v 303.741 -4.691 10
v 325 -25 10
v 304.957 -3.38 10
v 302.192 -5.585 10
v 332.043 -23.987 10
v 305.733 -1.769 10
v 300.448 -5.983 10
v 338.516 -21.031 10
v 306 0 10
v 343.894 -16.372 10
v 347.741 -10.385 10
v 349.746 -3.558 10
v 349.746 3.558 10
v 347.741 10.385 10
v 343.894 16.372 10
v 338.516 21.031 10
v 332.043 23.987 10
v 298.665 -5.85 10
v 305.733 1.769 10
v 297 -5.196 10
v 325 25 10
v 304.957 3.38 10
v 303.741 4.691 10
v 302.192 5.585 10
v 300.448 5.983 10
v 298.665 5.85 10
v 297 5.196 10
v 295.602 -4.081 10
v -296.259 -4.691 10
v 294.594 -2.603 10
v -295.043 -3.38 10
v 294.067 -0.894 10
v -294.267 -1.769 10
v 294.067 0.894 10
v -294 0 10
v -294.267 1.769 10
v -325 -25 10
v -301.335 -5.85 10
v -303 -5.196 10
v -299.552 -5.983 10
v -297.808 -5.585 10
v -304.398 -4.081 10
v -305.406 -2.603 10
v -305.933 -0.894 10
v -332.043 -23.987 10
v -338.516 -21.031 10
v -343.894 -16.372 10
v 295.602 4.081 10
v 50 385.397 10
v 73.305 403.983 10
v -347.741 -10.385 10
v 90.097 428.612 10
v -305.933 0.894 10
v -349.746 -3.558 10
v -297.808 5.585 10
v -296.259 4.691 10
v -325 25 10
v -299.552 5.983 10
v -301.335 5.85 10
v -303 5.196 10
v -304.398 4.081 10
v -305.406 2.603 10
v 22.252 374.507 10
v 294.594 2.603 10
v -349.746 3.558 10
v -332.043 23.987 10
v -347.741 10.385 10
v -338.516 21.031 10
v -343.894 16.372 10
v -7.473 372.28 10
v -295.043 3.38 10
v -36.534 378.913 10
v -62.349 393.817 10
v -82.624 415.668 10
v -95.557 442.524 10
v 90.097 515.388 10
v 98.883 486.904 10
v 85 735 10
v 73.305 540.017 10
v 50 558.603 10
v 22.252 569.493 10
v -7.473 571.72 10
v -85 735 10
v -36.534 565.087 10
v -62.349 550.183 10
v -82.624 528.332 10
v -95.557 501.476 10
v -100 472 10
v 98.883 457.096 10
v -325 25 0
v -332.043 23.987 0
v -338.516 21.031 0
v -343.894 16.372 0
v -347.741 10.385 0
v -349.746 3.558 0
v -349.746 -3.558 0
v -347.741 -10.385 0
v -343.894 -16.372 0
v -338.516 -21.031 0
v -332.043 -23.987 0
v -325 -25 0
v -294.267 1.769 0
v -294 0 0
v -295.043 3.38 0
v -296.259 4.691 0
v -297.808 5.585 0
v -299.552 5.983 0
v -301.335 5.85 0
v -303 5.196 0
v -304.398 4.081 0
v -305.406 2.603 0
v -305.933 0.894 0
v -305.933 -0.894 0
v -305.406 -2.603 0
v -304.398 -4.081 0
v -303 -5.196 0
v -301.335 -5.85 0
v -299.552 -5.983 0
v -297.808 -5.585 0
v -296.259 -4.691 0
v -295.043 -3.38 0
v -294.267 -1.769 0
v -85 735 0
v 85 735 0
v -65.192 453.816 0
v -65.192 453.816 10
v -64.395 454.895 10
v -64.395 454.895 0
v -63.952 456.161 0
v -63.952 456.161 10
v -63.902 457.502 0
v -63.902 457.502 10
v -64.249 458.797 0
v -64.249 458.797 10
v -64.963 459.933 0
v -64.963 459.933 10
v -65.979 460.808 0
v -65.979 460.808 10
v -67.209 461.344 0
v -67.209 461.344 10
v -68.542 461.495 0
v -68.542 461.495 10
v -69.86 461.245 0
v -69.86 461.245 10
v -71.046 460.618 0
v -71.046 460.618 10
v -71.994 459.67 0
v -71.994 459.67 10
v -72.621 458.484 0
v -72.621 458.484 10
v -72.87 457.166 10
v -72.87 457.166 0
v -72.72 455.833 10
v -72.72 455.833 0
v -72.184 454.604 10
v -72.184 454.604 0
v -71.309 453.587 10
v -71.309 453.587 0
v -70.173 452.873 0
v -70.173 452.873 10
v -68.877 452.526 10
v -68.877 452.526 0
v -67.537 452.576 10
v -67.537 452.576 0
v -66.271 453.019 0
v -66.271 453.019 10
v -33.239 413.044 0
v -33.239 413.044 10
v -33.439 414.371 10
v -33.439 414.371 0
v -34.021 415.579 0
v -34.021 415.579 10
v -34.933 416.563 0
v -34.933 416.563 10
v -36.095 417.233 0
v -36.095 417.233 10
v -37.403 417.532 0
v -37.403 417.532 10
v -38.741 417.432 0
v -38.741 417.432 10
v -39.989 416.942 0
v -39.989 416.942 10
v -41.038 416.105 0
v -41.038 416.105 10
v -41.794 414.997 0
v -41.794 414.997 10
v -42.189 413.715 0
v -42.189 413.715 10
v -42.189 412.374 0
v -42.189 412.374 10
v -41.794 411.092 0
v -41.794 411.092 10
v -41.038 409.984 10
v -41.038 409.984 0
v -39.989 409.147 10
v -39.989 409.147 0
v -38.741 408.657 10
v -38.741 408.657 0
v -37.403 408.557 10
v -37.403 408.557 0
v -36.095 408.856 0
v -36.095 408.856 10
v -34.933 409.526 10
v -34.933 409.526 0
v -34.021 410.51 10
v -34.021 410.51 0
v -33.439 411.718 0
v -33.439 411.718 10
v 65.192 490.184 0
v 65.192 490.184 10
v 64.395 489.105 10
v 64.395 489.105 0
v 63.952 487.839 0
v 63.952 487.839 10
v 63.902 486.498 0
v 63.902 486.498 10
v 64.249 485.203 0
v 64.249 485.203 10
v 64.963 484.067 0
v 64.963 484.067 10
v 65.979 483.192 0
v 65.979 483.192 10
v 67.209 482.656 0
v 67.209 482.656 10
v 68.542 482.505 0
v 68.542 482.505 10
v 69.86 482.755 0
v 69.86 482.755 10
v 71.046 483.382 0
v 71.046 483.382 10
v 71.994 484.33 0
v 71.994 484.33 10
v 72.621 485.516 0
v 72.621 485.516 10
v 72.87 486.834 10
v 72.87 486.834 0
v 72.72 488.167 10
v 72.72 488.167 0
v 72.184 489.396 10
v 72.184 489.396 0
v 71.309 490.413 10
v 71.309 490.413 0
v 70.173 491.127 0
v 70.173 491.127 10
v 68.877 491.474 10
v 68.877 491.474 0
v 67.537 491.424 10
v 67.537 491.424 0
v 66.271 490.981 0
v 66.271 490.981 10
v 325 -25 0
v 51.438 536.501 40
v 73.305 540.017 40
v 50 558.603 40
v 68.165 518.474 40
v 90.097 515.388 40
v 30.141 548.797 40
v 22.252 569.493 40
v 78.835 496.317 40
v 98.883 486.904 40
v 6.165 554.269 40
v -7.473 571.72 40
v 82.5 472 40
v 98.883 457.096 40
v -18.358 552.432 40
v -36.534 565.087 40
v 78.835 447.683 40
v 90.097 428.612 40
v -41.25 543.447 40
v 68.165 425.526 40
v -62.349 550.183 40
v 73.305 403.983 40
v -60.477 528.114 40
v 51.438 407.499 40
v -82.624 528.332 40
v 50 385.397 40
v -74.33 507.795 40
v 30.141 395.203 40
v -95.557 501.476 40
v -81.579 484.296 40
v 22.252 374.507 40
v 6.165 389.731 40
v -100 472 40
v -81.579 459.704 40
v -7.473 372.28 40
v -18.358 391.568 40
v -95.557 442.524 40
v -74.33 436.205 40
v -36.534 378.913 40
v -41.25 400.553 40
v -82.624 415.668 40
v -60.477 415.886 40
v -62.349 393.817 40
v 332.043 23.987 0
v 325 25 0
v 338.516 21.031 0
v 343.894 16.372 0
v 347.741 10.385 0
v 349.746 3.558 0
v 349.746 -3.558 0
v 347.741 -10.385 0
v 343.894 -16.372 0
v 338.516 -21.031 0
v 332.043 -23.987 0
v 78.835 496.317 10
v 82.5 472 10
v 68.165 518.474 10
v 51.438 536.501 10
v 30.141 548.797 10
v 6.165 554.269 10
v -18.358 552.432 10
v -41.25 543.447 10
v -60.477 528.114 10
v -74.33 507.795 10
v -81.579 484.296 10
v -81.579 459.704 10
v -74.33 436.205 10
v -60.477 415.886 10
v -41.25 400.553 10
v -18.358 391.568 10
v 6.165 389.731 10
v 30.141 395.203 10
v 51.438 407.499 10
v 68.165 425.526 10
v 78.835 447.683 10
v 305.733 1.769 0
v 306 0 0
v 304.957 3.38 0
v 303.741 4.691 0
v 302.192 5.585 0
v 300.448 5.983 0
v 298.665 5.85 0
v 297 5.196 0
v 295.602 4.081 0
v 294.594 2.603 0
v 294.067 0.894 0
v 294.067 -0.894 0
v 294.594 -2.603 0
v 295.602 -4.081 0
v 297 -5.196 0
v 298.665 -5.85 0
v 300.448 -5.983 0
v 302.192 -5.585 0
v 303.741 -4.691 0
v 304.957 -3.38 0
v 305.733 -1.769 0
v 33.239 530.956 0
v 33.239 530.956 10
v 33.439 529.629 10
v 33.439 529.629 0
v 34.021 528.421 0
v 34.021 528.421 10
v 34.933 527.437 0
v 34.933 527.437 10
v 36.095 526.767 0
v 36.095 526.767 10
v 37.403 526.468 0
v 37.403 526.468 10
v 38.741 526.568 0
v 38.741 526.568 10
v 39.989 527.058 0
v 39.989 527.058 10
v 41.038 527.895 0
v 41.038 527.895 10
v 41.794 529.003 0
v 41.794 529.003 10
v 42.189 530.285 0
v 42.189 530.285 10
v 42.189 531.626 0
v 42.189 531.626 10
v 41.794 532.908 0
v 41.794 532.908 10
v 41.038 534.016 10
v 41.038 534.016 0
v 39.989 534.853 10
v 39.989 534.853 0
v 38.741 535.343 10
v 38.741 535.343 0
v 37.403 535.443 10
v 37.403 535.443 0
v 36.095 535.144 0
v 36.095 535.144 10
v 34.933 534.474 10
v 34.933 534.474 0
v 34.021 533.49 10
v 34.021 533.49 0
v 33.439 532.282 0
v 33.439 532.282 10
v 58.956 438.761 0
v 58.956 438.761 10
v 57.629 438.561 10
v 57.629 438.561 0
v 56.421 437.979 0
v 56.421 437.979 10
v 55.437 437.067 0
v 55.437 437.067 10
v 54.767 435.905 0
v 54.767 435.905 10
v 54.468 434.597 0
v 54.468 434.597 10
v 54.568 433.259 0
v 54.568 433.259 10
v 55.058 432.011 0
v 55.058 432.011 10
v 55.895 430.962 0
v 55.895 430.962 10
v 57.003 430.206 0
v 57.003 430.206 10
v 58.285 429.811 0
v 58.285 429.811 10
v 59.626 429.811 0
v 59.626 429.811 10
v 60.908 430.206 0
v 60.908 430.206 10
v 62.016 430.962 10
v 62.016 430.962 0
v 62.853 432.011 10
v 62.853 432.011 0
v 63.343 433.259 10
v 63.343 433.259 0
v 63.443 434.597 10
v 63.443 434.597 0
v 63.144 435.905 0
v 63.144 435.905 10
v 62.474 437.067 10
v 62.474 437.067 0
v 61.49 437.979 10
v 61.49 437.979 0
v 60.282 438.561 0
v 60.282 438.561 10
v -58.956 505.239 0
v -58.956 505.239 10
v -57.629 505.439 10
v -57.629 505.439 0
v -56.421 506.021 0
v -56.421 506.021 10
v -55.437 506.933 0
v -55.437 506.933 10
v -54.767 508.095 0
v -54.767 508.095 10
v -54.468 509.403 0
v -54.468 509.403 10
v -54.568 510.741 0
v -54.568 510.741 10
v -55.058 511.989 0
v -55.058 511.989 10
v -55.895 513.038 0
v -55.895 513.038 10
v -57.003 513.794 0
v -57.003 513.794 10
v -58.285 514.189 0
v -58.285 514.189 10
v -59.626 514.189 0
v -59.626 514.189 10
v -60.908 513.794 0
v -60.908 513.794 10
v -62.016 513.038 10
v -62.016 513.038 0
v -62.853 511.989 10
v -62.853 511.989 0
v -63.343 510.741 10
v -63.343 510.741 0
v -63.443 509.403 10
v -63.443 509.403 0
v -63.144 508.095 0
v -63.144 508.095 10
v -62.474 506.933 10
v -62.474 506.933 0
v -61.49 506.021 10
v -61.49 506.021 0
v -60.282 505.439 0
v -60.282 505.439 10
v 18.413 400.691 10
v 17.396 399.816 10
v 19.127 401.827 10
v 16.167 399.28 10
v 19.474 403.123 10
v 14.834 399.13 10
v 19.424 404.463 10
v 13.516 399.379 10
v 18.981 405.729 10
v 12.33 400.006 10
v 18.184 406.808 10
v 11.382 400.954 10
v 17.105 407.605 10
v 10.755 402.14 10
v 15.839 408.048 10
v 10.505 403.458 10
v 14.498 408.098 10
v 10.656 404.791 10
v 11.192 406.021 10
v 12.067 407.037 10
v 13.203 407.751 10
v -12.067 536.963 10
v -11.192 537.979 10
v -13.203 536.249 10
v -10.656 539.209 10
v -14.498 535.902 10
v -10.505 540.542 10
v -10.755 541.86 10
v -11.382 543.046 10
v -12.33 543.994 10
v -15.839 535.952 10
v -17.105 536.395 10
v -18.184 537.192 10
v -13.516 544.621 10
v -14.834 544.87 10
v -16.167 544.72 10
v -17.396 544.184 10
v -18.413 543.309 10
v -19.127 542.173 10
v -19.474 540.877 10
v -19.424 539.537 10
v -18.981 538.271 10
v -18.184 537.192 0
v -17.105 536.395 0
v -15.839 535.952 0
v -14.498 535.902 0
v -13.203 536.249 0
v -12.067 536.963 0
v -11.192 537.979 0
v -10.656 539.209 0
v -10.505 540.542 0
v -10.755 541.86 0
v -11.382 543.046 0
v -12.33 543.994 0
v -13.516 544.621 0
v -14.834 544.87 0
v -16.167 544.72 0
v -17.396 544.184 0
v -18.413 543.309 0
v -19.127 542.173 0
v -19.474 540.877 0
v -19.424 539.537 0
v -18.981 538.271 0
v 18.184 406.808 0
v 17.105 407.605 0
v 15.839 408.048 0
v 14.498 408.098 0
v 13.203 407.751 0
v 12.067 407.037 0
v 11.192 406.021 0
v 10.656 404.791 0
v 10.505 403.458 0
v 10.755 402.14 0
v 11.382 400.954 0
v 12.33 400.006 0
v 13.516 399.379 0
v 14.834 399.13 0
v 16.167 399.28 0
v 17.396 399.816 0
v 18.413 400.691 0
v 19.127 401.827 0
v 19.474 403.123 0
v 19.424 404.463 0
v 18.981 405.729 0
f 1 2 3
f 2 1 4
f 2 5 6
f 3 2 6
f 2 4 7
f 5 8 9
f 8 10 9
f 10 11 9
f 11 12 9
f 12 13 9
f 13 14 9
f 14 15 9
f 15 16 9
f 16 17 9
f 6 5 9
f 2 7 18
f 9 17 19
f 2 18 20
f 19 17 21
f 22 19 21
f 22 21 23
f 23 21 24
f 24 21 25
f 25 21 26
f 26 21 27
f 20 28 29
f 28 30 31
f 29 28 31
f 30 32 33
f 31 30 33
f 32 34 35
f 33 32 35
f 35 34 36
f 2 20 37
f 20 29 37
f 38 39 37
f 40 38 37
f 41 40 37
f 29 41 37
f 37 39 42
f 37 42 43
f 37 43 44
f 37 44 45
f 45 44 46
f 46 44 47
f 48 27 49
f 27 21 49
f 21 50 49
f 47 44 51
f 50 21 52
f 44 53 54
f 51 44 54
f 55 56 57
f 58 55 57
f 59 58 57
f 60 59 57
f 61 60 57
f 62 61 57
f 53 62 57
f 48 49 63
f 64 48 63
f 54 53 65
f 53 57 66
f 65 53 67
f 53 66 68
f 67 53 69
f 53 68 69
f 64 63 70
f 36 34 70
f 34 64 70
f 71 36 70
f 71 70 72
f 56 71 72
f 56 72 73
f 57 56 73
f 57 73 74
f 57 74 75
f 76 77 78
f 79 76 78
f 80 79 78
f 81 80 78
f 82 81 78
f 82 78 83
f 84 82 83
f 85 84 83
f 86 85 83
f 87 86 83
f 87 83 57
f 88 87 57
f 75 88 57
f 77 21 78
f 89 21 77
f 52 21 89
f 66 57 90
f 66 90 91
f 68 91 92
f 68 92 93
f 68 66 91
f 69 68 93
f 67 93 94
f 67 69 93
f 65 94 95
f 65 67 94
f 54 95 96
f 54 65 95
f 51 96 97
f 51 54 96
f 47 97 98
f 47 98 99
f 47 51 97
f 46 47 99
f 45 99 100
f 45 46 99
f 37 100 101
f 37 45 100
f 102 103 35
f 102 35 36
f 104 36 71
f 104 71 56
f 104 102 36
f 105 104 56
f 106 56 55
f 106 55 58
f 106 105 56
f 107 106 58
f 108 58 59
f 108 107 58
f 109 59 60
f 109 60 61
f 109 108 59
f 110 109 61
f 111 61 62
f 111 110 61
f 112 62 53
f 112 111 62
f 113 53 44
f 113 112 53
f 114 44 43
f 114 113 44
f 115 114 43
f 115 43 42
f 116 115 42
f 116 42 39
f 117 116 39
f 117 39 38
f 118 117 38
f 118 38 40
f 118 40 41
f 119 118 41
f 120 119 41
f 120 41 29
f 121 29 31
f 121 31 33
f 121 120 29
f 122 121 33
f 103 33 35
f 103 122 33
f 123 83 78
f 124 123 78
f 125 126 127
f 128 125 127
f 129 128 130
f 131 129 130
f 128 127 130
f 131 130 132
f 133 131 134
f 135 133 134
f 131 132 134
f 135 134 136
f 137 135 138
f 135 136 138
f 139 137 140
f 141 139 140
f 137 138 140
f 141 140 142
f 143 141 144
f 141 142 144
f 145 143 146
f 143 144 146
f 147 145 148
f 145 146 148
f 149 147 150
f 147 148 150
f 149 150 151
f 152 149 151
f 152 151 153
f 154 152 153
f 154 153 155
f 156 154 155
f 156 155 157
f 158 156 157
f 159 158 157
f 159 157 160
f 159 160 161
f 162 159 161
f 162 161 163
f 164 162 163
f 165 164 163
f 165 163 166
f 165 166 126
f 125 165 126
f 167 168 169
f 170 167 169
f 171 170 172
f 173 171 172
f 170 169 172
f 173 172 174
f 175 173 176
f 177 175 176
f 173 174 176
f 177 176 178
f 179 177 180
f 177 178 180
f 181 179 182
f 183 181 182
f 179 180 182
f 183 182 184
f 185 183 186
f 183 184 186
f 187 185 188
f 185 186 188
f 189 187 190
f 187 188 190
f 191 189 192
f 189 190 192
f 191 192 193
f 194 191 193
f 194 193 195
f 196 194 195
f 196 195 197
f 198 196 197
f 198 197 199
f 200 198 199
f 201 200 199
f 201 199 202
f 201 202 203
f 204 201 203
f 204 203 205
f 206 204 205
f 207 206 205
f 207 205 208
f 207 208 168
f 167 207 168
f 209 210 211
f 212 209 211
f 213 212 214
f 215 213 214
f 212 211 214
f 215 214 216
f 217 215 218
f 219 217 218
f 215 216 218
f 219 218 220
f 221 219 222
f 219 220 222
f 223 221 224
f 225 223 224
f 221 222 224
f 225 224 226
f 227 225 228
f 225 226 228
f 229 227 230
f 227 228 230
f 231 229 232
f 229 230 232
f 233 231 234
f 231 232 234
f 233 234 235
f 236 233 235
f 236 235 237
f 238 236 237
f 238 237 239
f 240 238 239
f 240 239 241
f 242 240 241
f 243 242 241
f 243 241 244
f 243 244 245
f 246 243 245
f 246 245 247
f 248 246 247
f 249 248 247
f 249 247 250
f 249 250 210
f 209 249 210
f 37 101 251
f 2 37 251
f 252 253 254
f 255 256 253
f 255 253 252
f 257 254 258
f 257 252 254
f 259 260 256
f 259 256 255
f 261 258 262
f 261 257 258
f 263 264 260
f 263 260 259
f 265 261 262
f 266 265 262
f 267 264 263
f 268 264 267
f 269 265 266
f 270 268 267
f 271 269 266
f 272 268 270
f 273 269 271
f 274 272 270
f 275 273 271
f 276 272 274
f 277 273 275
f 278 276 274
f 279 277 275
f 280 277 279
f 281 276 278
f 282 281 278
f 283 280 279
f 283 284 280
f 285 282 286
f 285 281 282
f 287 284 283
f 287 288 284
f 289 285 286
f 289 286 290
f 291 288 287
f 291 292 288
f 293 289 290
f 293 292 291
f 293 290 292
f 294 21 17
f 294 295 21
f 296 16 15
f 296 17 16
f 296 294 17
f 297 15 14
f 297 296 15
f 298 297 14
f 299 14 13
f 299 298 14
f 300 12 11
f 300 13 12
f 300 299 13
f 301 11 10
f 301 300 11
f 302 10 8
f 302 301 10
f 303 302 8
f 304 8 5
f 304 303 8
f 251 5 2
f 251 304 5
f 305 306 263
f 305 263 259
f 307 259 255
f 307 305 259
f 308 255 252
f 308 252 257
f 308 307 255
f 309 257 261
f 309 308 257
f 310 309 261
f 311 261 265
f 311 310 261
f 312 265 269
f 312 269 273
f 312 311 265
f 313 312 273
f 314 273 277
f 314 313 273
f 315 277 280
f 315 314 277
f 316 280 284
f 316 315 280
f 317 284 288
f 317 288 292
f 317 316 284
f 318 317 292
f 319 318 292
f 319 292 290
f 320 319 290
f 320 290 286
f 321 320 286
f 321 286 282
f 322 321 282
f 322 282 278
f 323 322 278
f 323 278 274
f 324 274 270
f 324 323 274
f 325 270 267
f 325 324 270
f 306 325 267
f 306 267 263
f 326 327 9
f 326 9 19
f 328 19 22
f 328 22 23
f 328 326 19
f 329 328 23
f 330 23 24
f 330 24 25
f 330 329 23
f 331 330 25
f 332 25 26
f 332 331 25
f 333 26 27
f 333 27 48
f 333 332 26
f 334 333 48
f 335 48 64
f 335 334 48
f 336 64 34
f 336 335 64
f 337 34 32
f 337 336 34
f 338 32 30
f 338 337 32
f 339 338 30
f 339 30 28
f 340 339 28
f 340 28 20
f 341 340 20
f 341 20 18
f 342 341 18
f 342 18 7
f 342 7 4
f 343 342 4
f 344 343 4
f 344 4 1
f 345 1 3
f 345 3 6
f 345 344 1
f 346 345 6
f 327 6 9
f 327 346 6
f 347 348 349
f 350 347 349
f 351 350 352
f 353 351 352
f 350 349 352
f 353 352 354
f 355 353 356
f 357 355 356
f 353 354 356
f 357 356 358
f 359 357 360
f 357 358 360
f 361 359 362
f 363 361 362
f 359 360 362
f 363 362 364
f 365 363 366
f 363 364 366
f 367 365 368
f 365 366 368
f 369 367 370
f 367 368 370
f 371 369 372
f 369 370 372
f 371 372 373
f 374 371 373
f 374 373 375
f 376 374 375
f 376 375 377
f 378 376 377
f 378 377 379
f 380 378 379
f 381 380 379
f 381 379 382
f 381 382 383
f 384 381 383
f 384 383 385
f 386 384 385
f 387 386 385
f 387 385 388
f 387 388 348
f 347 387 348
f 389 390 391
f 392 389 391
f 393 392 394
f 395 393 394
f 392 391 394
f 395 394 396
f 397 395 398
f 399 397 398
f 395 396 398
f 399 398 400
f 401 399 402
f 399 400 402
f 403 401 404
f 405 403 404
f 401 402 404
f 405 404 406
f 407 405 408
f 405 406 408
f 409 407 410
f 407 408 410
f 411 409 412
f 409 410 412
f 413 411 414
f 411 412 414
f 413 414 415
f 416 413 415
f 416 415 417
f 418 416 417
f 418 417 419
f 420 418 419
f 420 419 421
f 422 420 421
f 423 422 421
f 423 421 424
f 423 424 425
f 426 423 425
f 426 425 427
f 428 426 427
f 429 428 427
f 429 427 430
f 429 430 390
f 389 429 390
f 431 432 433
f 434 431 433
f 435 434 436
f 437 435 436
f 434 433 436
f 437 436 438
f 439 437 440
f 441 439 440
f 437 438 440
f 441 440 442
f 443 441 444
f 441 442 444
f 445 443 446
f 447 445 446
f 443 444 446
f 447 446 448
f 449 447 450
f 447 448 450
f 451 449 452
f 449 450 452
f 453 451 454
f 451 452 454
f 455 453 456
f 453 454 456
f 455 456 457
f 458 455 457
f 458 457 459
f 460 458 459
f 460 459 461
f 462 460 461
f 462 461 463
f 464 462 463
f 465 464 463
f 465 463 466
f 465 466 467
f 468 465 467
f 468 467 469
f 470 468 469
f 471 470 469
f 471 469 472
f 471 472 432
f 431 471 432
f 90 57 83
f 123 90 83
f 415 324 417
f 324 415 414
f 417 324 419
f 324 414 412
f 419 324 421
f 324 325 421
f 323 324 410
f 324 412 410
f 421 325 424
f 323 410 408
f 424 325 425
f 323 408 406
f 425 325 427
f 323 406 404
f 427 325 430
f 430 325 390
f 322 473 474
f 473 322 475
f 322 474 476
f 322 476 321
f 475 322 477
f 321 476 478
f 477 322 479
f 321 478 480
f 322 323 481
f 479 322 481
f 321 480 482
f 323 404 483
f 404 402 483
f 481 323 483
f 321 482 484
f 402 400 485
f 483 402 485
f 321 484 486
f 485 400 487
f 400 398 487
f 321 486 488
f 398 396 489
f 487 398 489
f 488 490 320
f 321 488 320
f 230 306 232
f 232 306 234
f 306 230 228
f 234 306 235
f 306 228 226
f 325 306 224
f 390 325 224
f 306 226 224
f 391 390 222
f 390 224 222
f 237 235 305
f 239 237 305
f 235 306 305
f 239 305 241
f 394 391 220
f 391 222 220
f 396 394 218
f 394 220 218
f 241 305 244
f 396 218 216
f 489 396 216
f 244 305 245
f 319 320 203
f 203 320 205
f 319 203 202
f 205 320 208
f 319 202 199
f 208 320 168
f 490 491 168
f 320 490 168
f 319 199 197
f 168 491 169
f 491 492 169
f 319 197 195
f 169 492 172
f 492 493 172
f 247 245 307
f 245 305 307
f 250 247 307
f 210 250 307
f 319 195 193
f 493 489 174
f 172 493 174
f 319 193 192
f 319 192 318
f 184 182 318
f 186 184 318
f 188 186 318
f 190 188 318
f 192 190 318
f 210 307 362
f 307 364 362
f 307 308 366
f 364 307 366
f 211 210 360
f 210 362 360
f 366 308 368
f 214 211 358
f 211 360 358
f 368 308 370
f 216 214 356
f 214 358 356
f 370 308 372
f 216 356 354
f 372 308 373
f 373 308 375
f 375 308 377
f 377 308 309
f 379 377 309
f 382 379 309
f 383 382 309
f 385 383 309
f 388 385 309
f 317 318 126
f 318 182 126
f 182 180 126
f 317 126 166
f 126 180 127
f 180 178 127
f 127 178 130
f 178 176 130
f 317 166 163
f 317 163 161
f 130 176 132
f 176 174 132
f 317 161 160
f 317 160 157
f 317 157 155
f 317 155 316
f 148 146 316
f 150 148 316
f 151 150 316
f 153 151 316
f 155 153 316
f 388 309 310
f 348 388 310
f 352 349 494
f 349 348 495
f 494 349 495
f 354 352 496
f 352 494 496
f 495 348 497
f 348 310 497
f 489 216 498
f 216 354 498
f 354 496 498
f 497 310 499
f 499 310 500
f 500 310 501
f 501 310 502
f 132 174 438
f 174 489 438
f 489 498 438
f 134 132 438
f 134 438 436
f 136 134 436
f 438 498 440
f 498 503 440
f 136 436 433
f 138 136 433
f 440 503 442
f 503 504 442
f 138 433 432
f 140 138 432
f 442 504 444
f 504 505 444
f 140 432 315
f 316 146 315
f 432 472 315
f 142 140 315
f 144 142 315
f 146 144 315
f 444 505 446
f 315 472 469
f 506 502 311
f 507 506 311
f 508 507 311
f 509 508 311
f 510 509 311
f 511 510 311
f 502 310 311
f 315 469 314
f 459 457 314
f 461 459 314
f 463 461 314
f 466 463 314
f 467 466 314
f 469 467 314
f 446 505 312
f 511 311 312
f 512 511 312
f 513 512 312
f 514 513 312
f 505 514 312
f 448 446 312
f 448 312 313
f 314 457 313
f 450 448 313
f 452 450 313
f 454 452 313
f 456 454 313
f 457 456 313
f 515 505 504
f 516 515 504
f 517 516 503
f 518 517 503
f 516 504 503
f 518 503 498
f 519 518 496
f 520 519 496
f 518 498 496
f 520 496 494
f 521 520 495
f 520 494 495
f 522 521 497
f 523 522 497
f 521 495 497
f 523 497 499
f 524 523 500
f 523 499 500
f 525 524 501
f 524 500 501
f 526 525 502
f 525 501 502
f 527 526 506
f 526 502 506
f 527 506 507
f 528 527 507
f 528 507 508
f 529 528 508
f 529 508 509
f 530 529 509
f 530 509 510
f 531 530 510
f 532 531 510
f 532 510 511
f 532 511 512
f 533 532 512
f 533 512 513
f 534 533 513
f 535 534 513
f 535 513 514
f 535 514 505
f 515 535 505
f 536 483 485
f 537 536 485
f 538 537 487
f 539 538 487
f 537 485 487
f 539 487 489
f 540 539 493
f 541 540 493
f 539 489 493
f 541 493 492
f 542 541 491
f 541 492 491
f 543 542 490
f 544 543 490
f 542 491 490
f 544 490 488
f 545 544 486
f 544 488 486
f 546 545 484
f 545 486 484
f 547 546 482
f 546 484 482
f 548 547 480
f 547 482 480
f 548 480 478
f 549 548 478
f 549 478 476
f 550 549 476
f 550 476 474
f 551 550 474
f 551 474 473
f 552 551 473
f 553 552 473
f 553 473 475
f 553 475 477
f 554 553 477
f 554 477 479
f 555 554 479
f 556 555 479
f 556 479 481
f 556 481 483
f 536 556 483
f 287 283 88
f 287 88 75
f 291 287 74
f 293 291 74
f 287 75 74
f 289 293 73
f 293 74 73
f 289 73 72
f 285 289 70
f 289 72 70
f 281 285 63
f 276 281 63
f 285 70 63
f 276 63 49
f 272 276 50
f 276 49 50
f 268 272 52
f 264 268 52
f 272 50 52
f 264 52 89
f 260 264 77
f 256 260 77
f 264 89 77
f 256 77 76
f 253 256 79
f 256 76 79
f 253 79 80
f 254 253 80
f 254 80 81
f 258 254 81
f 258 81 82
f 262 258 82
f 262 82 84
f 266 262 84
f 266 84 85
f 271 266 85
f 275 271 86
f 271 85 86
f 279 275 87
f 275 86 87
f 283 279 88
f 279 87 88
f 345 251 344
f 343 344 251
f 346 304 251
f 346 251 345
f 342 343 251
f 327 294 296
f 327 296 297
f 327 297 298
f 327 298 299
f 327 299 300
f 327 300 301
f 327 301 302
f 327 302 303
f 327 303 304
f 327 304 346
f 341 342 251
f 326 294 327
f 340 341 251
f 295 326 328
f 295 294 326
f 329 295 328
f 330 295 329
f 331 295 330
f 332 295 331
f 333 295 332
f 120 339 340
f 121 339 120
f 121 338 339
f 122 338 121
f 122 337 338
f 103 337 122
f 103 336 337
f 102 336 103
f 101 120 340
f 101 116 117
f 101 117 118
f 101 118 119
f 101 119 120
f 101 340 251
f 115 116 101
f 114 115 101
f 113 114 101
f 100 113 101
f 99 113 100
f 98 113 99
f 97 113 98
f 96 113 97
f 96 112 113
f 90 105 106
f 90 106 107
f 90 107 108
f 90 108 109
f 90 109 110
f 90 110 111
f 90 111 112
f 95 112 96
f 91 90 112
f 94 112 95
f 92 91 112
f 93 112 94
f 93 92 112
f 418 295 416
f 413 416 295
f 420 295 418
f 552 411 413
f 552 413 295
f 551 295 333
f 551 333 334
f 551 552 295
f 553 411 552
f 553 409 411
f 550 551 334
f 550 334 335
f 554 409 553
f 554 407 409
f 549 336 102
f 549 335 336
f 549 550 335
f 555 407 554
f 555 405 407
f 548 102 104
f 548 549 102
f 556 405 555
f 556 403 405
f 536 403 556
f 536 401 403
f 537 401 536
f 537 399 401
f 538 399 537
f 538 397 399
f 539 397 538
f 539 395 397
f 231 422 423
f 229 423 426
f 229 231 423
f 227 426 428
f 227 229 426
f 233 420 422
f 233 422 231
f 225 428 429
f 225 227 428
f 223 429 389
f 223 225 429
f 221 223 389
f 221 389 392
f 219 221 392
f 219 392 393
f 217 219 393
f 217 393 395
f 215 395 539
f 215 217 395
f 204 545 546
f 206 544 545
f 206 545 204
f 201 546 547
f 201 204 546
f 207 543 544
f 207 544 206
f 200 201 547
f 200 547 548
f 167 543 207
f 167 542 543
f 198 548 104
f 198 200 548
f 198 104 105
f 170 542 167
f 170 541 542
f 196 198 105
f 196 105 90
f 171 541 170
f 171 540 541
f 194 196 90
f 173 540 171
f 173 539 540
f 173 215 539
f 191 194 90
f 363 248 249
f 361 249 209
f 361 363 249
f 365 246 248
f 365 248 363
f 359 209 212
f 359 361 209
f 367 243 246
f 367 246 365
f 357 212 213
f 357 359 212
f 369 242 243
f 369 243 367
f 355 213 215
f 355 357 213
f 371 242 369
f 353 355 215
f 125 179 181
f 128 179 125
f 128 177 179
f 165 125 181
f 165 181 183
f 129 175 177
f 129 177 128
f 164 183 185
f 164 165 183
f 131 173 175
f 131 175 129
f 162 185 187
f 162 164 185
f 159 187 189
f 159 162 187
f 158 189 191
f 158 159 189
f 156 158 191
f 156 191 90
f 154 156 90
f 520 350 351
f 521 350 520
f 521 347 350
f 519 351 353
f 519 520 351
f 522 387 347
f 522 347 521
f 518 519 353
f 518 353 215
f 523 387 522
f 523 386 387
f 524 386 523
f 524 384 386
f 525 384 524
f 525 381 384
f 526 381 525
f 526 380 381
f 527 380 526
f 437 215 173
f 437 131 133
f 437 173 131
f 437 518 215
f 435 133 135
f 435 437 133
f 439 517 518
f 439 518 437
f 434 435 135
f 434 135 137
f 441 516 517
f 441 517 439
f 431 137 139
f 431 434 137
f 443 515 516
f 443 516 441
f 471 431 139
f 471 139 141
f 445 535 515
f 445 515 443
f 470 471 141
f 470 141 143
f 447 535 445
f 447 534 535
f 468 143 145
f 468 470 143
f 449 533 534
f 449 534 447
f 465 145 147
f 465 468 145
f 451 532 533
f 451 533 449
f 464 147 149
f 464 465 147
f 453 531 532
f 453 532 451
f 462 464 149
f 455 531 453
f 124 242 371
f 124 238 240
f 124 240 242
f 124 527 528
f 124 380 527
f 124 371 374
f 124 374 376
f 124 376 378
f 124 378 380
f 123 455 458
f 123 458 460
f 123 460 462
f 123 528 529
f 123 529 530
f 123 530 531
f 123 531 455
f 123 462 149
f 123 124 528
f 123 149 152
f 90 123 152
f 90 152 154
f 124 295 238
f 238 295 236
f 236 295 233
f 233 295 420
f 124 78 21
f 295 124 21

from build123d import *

# Parameters (mm, degrees)
SKETCH1_W           = 700
SKETCH1_H           = 50
SKETCH1_R           = 6
BOSS_EXTRUDE1_DEPTH = 10
FILLET1_RADIUS      = 25
FILLET1_LENGTH      = 10
FILLET2_RADIUS      = 25
FILLET2_LENGTH      = 10
BOSS_EXTRUDE2_DEPTH = 10
SKETCH3_R           = 100
SKETCH3_R_2         = 82.5
BOSS_EXTRUDE3_DEPTH = 30
SKETCH4_R           = 4.5
CUT_EXTRUDE1_DEPTH  = 815.631818676
CIRPATTERN1_COUNT   = 8


with BuildPart() as part:
    # Sketch1 → Boss-Extrude1 (new body)
    with BuildSketch(Plane.XY):
        Rectangle(SKETCH1_W, SKETCH1_H)
        with Locations((-300, 0)):
            Circle(SKETCH1_R, mode=Mode.SUBTRACT)
        with Locations((300, 0)):
            Circle(SKETCH1_R, mode=Mode.SUBTRACT)
    extrude(amount=BOSS_EXTRUDE1_DEPTH)

    # Fillet1: full round fillet: the end face becomes a half cylinder, R = half its width
    fillet1_face = Plane((-350, 0, 5), x_dir=(0, 0, 1), z_dir=(-1, 0, 0))  # on the end face: x along it, z out of the body
    fillet1_slab = fillet1_face.offset(-FILLET1_RADIUS / 2) * Box(FILLET1_LENGTH, 2 * FILLET1_RADIUS, FILLET1_RADIUS, mode=Mode.PRIVATE)  # the body's end, R deep
    fillet1_round = Plane((-325, 0, 5), x_dir=(-1, 0, 0), z_dir=(0, 0, 1)) * Cylinder(FILLET1_RADIUS, FILLET1_LENGTH, mode=Mode.PRIVATE)  # its axis R under the face
    add(fillet1_slab - fillet1_round, mode=Mode.SUBTRACT)

    # Fillet2: full round fillet: the end face becomes a half cylinder, R = half its width
    fillet2_face = Plane((350, 0, 5), x_dir=(0, 0, -1), z_dir=(1, 0, 0))  # on the end face: x along it, z out of the body
    fillet2_slab = fillet2_face.offset(-FILLET2_RADIUS / 2) * Box(FILLET2_LENGTH, 2 * FILLET2_RADIUS, FILLET2_RADIUS, mode=Mode.PRIVATE)  # the body's end, R deep
    fillet2_round = Plane((325, 0, 5), x_dir=(1, 0, 0), z_dir=(0, 0, -1)) * Cylinder(FILLET2_RADIUS, FILLET2_LENGTH, mode=Mode.PRIVATE)  # its axis R under the face
    add(fillet2_slab - fillet2_round, mode=Mode.SUBTRACT)

    # Sketch2 → Boss-Extrude2 (add)
    with BuildSketch(Plane.XY.offset(10)):
        Polygon((-325, 25), (-85, 735), (85, 735), (325, 25), align=None)
    extrude(amount=-BOSS_EXTRUDE2_DEPTH)

    # Sketch3 → Boss-Extrude3 (add)
    with BuildSketch(Plane.XY.offset(10)):
        with Locations(Location((0, 472, 0), (0, 0, 180))):
            Circle(SKETCH3_R)
        with Locations((0, 472)):
            Circle(SKETCH3_R_2, mode=Mode.SUBTRACT)
    extrude(amount=BOSS_EXTRUDE3_DEPTH)

    # Sketch4 → Cut-Extrude1 (cut, through all)
    with BuildSketch(Plane.XY.offset(10)):
        with Locations((-37.739196917, 413.044482735)):
            Circle(SKETCH4_R)
    cut_extrude1 = extrude(amount=-CUT_EXTRUDE1_DEPTH, mode=Mode.SUBTRACT)

    # CirPattern1: Cut-Extrude1 ×8 about axis
    cirpattern1_axis = Axis((0, 472, 0), (0, 0, 1))
    for i in range(1, CIRPATTERN1_COUNT):
        add(cut_extrude1.rotate(cirpattern1_axis, i * 360 / CIRPATTERN1_COUNT), mode=Mode.SUBTRACT)


solid = part.part
